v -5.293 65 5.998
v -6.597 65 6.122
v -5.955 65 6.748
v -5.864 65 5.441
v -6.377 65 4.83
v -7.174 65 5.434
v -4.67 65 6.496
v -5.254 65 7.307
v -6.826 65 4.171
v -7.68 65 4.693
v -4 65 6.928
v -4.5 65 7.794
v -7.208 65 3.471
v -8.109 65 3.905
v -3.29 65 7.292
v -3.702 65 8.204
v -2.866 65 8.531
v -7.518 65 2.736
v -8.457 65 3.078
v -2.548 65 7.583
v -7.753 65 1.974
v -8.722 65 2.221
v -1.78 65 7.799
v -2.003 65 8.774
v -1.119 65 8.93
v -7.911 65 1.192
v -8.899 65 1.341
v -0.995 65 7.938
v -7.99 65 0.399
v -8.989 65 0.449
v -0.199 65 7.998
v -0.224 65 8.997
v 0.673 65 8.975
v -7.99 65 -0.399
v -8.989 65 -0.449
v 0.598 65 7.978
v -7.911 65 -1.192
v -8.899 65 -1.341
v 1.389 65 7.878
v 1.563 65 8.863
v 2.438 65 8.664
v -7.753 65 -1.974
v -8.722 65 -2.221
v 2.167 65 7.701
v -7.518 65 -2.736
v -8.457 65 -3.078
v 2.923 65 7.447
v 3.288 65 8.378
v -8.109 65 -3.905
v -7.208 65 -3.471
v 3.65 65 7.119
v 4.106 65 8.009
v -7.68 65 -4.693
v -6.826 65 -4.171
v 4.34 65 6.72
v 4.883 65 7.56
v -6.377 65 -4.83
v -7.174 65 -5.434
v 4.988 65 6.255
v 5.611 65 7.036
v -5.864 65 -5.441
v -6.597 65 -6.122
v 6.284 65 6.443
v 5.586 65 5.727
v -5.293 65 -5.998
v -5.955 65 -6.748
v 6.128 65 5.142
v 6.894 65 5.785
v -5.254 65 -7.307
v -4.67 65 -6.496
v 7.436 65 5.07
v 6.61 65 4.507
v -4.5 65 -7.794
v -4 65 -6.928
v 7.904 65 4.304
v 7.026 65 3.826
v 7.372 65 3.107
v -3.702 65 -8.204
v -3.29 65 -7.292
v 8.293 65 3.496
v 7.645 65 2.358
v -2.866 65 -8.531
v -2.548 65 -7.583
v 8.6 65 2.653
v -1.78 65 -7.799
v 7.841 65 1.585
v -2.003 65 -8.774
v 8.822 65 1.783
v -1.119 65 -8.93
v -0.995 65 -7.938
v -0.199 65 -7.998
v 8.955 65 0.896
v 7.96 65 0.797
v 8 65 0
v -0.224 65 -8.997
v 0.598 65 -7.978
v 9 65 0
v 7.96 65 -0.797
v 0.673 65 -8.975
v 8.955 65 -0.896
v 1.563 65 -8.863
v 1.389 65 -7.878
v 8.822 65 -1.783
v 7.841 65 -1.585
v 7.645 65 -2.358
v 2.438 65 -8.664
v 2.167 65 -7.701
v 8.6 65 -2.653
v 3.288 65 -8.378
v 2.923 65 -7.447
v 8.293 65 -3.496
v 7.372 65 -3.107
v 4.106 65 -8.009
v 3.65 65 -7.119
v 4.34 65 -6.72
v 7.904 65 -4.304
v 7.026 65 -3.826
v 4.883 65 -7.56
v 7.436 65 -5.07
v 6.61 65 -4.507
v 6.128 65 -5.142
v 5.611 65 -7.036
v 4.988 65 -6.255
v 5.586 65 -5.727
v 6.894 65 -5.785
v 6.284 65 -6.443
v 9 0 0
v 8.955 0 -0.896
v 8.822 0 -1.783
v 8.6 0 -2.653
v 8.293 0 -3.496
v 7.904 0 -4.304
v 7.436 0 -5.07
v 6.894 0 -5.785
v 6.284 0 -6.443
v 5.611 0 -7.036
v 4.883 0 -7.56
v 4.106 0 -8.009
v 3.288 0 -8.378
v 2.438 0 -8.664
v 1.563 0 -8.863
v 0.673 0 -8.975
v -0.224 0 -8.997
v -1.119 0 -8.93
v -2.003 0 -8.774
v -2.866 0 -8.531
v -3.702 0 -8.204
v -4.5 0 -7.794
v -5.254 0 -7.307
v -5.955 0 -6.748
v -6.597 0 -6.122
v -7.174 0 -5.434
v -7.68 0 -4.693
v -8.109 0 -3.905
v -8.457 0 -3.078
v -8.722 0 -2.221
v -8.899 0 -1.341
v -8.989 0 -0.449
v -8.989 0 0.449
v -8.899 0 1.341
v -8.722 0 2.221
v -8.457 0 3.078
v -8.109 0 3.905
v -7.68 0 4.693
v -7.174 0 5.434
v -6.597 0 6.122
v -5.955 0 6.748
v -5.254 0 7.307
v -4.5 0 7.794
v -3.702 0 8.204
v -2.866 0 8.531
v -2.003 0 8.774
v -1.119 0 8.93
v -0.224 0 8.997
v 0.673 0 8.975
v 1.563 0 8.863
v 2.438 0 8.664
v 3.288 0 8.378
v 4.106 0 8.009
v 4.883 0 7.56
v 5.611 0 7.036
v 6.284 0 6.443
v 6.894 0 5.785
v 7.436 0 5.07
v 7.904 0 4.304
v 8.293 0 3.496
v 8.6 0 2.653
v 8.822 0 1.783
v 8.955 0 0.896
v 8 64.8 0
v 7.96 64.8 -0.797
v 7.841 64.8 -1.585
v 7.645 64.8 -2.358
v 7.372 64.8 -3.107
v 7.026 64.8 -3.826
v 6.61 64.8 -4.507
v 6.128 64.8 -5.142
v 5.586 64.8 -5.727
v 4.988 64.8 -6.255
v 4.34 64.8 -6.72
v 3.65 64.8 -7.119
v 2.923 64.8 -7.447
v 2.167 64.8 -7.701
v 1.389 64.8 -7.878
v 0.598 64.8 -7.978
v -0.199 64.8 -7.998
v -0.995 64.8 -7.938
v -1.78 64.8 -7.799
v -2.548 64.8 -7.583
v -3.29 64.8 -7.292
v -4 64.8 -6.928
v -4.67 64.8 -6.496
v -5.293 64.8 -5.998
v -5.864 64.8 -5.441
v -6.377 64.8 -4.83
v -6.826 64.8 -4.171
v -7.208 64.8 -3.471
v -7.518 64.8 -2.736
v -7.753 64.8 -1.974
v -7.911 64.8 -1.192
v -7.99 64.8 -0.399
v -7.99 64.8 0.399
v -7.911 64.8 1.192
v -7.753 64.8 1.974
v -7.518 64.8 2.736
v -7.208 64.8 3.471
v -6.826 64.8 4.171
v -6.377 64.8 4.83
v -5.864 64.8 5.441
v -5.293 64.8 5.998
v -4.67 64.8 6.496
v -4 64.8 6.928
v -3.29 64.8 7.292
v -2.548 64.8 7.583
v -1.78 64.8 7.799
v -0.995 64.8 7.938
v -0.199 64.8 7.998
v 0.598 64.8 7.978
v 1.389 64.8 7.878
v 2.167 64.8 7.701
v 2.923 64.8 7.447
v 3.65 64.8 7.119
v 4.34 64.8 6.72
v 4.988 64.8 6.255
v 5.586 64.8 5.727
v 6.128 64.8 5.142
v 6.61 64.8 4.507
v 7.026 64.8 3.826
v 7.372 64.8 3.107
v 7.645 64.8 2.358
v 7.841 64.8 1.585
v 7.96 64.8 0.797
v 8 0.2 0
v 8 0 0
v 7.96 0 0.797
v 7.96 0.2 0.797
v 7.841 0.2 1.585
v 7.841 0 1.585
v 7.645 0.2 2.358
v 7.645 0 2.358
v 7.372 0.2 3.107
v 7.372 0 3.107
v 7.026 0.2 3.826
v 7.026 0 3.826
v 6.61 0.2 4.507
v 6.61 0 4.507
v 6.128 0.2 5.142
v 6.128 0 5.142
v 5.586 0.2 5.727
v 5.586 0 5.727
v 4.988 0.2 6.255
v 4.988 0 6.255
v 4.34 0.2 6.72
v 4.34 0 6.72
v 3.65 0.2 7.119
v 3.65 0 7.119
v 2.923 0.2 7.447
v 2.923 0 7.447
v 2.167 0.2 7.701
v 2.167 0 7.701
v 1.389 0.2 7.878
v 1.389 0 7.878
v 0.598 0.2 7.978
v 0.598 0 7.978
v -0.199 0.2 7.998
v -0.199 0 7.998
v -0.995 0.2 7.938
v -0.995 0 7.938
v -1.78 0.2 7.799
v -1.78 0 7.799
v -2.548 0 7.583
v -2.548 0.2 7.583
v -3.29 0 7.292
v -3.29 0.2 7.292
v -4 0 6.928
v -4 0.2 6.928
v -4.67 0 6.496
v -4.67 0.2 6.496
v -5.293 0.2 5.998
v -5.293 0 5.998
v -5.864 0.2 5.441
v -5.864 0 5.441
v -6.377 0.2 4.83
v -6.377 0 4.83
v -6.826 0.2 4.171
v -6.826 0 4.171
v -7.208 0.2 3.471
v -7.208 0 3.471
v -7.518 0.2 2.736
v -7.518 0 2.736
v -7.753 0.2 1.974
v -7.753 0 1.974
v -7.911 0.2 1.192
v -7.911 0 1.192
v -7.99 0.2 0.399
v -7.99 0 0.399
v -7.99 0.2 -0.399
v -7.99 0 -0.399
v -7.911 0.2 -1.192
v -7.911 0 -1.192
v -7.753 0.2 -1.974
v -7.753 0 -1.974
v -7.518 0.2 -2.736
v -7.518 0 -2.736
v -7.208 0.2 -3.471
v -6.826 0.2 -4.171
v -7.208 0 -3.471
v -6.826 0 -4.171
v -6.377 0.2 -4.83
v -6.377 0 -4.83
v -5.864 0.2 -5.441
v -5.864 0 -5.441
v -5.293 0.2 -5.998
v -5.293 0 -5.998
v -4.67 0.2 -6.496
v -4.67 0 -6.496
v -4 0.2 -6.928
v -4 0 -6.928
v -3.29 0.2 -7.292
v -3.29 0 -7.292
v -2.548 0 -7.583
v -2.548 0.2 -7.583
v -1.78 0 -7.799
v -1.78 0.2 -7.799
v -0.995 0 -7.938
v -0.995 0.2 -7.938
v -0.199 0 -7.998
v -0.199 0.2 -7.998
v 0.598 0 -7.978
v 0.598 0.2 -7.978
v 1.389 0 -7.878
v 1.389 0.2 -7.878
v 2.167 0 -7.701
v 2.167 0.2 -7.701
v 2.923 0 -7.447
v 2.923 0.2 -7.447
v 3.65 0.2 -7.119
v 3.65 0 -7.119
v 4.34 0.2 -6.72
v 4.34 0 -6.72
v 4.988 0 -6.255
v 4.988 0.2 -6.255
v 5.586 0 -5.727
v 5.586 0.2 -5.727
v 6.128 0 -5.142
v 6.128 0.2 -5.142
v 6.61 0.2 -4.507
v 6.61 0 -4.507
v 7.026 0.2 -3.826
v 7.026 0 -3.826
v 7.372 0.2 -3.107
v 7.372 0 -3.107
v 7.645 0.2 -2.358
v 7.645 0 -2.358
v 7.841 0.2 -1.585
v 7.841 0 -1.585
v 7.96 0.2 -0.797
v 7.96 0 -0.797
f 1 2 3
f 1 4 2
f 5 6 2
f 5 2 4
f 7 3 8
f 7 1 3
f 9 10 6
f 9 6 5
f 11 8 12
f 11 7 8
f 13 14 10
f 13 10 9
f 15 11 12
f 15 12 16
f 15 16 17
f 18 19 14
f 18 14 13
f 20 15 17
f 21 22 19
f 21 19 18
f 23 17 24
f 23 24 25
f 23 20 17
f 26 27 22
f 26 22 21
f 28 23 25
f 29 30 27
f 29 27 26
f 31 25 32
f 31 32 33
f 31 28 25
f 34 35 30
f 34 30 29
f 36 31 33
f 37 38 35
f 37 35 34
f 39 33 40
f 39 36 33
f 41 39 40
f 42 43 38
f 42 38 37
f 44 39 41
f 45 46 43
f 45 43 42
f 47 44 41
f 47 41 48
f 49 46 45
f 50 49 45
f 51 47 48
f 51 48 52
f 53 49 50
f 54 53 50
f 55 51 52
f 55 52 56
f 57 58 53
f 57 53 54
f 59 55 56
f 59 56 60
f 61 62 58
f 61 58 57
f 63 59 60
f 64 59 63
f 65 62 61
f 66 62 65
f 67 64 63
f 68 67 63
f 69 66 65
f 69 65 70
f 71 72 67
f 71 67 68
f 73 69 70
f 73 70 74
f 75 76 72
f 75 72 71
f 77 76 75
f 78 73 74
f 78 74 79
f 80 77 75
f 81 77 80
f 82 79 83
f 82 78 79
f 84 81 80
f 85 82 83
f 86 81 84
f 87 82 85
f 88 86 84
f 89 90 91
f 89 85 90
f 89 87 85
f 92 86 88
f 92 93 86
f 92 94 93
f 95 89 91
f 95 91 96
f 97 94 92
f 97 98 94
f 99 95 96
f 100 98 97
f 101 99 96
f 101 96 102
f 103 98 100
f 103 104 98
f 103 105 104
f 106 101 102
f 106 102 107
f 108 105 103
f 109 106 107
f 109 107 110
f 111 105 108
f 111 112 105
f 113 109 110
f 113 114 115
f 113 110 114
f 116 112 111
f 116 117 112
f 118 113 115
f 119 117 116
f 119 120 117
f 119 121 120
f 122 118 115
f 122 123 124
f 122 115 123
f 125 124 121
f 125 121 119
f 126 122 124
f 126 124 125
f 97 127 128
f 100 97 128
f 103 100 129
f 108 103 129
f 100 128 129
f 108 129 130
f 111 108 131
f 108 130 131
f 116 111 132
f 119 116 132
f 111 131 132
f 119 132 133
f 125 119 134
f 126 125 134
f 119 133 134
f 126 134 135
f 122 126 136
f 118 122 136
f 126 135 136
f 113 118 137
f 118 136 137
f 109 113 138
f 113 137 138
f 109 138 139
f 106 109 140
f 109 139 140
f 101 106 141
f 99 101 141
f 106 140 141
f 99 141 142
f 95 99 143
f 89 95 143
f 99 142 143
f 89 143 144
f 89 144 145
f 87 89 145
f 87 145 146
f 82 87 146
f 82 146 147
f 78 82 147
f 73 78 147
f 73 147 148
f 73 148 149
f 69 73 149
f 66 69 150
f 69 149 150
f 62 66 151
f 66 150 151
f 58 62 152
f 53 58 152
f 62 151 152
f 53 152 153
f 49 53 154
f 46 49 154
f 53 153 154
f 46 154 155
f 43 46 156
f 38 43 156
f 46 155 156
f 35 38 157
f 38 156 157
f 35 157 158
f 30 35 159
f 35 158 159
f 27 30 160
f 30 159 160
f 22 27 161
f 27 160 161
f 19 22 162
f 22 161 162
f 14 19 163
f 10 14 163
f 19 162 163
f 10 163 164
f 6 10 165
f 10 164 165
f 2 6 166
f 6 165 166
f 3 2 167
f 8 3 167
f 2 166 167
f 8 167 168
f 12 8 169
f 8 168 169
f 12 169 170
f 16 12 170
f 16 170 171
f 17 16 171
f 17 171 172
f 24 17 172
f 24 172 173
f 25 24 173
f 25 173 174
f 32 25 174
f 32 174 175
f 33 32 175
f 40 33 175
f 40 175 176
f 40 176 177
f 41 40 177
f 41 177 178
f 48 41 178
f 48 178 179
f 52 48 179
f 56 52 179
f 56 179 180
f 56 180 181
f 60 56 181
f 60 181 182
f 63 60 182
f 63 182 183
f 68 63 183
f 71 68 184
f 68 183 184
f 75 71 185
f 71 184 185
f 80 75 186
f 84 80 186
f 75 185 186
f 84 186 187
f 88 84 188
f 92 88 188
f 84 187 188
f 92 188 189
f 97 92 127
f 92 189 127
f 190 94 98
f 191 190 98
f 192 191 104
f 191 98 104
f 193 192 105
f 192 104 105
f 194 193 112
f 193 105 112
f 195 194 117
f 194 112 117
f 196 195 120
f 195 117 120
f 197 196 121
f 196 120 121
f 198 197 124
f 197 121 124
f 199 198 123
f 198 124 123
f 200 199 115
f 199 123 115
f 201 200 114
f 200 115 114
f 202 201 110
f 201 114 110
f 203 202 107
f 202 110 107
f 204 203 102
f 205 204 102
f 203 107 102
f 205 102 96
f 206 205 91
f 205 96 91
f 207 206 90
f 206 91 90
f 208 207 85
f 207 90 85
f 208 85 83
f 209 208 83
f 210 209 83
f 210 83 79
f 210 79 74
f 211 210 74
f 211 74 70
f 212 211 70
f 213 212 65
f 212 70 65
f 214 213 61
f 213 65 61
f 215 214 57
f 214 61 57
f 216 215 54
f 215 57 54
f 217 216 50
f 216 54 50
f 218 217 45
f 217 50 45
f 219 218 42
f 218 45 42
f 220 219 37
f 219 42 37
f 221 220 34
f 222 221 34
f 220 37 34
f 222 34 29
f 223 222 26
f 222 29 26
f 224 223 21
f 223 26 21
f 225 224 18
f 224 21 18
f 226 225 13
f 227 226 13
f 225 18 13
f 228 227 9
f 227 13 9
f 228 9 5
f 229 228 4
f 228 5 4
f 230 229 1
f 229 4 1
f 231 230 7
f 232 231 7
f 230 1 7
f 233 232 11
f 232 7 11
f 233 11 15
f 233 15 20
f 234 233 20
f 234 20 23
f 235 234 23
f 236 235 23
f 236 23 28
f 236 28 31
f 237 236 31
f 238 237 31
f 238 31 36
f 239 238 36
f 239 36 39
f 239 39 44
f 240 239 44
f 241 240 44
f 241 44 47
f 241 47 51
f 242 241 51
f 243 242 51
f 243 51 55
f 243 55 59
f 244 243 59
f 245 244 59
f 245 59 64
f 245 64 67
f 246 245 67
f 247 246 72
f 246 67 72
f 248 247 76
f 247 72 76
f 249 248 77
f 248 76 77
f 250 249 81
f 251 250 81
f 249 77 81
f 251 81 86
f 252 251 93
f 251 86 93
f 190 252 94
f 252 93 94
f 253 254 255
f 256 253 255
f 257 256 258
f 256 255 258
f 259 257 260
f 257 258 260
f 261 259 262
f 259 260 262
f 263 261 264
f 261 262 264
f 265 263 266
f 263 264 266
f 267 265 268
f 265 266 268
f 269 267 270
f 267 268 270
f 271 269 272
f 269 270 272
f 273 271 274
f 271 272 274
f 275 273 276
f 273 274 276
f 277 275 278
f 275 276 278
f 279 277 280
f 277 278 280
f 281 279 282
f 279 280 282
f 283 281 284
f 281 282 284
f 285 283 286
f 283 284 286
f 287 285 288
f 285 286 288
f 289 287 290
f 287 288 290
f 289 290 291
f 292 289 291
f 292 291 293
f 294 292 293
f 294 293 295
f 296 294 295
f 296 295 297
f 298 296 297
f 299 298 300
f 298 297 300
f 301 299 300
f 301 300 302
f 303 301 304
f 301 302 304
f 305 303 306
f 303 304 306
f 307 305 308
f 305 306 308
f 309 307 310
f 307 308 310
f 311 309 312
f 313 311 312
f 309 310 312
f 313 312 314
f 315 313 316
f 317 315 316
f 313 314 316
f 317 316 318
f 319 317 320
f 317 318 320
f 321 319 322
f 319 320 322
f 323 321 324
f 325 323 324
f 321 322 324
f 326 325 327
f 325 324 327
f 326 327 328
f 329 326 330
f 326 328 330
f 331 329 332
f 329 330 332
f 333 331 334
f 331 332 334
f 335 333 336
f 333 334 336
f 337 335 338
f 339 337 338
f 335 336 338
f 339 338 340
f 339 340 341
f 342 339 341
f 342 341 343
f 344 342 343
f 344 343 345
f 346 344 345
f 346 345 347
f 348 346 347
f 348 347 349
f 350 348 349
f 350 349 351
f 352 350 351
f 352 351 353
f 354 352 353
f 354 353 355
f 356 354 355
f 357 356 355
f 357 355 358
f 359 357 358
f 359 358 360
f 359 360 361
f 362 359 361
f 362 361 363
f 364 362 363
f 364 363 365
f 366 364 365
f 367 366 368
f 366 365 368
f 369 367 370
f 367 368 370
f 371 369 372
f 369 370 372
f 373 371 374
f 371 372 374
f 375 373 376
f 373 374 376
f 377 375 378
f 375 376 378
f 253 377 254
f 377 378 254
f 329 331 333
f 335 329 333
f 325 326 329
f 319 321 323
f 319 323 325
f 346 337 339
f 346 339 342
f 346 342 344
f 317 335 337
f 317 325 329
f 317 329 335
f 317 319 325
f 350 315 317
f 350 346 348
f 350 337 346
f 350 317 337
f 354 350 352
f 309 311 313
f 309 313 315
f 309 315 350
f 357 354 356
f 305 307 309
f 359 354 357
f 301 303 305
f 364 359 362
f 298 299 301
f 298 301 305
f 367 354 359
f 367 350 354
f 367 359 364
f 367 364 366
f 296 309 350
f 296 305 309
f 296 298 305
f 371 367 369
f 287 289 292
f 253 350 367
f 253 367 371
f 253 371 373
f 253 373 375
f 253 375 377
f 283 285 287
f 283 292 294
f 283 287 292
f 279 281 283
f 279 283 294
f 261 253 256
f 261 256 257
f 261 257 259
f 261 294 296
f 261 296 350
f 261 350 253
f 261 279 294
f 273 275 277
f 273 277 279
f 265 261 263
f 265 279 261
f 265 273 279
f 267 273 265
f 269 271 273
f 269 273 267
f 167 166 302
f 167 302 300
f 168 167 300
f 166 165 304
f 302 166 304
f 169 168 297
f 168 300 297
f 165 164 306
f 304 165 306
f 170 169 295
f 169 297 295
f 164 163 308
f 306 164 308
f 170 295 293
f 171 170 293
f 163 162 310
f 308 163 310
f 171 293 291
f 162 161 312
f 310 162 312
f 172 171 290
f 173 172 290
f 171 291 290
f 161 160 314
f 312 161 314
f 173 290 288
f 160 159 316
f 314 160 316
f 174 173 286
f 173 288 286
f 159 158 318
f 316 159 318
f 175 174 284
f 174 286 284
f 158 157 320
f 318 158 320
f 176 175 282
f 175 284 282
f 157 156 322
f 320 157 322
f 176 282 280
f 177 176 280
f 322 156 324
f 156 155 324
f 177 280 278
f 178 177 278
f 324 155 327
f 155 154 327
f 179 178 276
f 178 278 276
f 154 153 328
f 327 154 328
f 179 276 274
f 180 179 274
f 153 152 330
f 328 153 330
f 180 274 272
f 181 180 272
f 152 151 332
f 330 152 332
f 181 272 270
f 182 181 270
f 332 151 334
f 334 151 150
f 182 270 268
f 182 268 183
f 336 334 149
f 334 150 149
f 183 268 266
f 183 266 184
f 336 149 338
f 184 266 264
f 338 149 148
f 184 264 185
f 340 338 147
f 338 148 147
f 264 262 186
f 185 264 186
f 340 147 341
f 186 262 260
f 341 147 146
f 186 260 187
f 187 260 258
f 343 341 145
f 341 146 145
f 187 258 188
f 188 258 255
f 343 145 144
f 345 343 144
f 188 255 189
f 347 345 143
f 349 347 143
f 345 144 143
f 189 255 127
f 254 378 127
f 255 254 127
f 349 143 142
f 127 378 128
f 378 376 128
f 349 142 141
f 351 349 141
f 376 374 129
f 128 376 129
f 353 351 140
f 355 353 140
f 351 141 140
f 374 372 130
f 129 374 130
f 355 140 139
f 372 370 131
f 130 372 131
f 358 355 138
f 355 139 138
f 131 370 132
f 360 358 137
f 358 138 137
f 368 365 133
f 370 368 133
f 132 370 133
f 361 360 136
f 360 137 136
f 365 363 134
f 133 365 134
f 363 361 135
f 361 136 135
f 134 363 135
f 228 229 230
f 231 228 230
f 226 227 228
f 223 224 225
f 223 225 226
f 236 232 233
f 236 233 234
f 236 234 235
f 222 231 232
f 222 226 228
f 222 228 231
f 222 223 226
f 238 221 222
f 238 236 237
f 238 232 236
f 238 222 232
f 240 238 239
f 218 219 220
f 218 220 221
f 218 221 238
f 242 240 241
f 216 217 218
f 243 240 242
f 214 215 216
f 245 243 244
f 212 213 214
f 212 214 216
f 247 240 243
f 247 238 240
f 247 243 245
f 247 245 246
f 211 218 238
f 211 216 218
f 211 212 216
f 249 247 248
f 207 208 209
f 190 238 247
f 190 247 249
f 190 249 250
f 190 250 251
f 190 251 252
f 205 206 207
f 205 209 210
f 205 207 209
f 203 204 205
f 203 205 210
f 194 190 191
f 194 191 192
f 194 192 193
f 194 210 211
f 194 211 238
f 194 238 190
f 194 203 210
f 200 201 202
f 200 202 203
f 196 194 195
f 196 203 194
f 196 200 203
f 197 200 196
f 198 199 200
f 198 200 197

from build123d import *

# Parameters (mm, degrees)
SKETCH1_R           = 9
BOSS_EXTRUDE1_DEPTH = 65
SKETCH2_R           = 8
CUT_EXTRUDE1_DEPTH  = 0.2
SKETCH3_R           = 8
CUT_EXTRUDE2_DEPTH  = 0.2


with BuildPart() as part:
    # Sketch1 → Boss-Extrude1 (new body)
    with BuildSketch(Plane(origin=(0, 0, 0), x_dir=(1, 0, 0), z_dir=(0, 1, 0))):
        Circle(SKETCH1_R)
    extrude(amount=BOSS_EXTRUDE1_DEPTH)

    # Sketch2 → Cut-Extrude1 (cut)
    with BuildSketch(Plane(origin=(0, 65, 0), x_dir=(1, 0, 0), z_dir=(0, 1, 0))):
        Circle(SKETCH2_R)
    extrude(amount=-CUT_EXTRUDE1_DEPTH, mode=Mode.SUBTRACT)

    # Sketch3 → Cut-Extrude2 (cut)
    with BuildSketch(Plane.XZ):
        Circle(SKETCH3_R)
    extrude(amount=-CUT_EXTRUDE2_DEPTH, mode=Mode.SUBTRACT)


solid = part.part
